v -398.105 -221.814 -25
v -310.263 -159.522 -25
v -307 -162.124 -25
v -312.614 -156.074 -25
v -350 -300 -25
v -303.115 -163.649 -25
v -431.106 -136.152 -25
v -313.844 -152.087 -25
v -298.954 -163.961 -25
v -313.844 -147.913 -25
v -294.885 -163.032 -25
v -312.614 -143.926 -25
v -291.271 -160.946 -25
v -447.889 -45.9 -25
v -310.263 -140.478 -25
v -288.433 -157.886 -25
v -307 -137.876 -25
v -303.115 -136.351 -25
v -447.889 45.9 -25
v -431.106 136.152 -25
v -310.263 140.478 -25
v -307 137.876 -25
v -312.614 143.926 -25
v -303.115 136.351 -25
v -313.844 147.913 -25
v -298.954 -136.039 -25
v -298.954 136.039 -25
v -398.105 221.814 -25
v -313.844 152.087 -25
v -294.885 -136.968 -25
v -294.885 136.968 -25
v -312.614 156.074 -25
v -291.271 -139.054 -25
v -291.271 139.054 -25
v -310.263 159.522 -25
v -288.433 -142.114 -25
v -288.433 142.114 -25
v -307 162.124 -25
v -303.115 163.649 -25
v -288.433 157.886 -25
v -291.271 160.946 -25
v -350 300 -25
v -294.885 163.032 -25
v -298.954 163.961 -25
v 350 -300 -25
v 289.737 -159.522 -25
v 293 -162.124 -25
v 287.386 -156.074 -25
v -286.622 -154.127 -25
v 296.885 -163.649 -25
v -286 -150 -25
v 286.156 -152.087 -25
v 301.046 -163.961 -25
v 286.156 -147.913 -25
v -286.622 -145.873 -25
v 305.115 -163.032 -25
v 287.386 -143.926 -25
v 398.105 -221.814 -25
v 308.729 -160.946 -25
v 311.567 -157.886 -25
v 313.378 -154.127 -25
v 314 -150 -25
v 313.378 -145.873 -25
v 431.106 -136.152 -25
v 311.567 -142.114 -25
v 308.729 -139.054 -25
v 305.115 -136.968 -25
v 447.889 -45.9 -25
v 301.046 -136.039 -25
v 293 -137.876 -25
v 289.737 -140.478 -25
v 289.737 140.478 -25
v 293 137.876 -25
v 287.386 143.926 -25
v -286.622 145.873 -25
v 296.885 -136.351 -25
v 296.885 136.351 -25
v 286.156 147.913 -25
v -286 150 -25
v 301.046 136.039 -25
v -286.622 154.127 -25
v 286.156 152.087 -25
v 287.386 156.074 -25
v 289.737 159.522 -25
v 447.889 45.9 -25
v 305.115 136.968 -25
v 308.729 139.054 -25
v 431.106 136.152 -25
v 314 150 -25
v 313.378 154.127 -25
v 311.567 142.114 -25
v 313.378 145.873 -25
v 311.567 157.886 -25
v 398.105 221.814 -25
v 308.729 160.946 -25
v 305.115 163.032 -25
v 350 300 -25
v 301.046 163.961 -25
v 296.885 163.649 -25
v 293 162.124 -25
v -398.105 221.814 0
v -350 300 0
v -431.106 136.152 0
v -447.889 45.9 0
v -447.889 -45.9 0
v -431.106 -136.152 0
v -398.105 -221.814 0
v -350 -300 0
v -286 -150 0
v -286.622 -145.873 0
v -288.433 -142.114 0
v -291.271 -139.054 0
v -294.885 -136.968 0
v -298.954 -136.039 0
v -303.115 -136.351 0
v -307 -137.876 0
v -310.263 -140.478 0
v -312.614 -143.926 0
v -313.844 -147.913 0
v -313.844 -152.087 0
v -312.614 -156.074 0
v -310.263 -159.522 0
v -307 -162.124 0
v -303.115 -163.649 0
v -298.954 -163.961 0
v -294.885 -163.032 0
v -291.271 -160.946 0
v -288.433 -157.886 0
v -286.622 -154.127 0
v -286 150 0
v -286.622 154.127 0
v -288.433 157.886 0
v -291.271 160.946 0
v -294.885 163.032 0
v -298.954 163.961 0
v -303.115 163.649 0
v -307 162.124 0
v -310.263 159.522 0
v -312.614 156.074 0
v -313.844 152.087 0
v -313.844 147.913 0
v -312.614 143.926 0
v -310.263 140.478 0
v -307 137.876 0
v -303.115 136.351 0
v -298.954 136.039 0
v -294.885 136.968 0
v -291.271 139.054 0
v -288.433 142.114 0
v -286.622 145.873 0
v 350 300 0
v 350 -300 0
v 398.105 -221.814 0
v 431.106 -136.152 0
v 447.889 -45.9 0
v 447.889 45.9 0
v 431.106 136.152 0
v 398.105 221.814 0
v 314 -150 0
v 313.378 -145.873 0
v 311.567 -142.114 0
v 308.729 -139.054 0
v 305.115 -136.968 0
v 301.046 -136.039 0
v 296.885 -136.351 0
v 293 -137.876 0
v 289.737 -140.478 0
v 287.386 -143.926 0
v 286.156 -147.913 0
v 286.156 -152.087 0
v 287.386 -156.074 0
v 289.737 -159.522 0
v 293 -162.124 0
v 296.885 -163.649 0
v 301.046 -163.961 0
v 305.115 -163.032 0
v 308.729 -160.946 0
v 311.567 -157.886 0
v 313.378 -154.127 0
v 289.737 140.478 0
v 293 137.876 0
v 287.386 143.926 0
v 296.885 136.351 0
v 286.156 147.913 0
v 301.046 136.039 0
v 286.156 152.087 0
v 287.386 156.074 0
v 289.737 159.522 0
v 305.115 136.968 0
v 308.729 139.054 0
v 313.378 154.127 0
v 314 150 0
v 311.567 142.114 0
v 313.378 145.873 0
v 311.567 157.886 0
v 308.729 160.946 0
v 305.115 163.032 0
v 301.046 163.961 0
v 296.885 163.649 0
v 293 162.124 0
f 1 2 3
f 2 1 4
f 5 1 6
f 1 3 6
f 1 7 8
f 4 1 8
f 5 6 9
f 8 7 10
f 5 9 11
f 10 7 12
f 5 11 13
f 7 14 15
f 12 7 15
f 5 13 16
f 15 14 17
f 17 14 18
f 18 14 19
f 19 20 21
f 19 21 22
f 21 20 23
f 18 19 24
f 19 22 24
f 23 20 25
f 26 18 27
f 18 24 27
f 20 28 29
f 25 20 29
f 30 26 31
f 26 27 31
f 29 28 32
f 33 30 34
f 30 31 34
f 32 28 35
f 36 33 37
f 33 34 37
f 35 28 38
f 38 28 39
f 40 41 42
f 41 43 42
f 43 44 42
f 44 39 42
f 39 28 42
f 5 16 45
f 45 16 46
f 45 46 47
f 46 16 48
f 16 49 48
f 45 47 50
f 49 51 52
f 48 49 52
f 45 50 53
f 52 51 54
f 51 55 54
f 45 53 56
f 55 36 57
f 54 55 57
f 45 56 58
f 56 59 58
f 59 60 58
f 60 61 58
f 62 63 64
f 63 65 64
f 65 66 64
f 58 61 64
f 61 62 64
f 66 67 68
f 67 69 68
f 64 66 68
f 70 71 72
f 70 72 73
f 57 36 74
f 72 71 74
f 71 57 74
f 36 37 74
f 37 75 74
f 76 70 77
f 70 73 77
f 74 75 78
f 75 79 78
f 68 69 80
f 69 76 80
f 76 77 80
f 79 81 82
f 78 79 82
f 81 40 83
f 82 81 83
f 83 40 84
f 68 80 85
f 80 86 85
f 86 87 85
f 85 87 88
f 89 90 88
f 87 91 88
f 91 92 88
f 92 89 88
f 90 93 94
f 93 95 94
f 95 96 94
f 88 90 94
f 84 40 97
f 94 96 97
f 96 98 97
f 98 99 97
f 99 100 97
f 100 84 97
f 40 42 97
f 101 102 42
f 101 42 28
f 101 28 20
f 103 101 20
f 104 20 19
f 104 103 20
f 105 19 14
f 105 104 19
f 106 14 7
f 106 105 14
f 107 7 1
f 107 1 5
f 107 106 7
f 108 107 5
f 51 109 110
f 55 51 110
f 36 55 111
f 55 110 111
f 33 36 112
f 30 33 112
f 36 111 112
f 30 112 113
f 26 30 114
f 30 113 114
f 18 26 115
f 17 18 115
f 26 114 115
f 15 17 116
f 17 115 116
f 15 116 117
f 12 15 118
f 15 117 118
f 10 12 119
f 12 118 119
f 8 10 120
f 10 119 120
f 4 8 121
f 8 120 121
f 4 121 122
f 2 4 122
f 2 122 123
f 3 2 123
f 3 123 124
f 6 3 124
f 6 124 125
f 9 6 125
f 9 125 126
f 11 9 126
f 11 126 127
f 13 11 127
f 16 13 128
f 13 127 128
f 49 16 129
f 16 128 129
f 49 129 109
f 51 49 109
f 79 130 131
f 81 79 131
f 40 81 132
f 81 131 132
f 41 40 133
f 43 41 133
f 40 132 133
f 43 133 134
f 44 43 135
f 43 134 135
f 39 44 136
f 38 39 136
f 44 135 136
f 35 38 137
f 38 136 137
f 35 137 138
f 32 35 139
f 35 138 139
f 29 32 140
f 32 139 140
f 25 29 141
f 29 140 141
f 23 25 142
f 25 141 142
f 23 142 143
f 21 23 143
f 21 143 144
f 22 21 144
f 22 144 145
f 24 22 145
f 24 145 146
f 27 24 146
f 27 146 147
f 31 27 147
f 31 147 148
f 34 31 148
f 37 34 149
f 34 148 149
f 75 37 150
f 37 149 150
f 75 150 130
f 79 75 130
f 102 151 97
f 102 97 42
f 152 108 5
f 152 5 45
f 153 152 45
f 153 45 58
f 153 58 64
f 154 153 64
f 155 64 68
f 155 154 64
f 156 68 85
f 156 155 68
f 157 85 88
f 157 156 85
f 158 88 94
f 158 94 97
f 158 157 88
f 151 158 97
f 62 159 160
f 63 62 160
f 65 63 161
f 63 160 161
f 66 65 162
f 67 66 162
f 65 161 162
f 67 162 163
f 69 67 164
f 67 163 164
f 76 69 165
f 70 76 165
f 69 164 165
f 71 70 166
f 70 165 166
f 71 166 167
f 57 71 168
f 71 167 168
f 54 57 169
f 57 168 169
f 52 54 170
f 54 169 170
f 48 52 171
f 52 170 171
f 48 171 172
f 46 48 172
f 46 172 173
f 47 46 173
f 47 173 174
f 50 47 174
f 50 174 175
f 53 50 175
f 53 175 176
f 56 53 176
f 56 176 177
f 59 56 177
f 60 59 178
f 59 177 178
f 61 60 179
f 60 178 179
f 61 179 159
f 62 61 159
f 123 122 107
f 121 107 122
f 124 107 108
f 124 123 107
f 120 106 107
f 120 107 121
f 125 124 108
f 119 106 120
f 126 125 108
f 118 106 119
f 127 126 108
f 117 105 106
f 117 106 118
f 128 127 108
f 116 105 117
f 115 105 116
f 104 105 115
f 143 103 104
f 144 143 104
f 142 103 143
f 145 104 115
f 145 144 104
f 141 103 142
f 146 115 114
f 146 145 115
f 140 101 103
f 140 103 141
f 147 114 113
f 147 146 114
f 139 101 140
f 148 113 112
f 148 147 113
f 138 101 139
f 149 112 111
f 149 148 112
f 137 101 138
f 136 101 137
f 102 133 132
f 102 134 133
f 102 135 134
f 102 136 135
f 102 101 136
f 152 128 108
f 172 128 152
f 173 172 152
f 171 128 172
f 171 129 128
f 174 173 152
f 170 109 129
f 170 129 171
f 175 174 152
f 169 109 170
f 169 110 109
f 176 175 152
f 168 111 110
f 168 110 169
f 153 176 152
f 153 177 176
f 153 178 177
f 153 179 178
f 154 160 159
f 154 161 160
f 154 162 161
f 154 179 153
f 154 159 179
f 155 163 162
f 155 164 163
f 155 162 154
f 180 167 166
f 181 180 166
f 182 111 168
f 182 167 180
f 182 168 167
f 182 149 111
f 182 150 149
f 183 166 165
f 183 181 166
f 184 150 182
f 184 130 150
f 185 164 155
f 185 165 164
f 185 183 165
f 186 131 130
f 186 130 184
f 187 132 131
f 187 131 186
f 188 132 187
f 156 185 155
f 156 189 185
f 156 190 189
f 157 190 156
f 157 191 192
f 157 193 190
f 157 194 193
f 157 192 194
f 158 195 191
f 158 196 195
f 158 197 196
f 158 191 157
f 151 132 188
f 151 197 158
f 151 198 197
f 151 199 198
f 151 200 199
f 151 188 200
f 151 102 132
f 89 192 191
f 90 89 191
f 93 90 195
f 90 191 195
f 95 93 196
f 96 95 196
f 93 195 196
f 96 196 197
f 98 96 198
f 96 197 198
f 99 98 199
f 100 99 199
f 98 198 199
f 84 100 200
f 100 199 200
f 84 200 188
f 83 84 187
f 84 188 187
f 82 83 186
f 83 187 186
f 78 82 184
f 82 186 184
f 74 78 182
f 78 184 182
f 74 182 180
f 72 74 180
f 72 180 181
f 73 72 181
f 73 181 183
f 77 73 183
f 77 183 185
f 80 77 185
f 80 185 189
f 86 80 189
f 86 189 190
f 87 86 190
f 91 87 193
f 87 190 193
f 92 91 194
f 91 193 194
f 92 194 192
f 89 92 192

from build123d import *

# Parameters (mm, degrees)
F0_R     = 14
F0_R_2   = 250
F1_DEPTH = 25


with BuildPart() as f1:
    # F0 (on Top) → F1 (new body)
    with BuildSketch(Plane.XY):
        with BuildLine():
            Line((350, 300), (-350, 300))
            ThreePointArc((-350, 300), (-450, 0), (-350, -300))
            Line((-350, -300), (350, -300))
            ThreePointArc((350, -300), (450, 0), (350, 300))
        make_face()
        with Locations((-300, -150)):
            Circle(F0_R, mode=Mode.SUBTRACT)
        with Locations((300, -150)):
            Circle(F0_R, mode=Mode.SUBTRACT)
        with Locations((-300, 150)):
            Circle(F0_R, mode=Mode.SUBTRACT)
        Circle(F0_R_2, mode=Mode.SUBTRACT)
        with Locations((300, 150)):
            Circle(F0_R, mode=Mode.SUBTRACT)
        Circle(F0_R_2)
    extrude(amount=-F1_DEPTH)


solid = f1.part
